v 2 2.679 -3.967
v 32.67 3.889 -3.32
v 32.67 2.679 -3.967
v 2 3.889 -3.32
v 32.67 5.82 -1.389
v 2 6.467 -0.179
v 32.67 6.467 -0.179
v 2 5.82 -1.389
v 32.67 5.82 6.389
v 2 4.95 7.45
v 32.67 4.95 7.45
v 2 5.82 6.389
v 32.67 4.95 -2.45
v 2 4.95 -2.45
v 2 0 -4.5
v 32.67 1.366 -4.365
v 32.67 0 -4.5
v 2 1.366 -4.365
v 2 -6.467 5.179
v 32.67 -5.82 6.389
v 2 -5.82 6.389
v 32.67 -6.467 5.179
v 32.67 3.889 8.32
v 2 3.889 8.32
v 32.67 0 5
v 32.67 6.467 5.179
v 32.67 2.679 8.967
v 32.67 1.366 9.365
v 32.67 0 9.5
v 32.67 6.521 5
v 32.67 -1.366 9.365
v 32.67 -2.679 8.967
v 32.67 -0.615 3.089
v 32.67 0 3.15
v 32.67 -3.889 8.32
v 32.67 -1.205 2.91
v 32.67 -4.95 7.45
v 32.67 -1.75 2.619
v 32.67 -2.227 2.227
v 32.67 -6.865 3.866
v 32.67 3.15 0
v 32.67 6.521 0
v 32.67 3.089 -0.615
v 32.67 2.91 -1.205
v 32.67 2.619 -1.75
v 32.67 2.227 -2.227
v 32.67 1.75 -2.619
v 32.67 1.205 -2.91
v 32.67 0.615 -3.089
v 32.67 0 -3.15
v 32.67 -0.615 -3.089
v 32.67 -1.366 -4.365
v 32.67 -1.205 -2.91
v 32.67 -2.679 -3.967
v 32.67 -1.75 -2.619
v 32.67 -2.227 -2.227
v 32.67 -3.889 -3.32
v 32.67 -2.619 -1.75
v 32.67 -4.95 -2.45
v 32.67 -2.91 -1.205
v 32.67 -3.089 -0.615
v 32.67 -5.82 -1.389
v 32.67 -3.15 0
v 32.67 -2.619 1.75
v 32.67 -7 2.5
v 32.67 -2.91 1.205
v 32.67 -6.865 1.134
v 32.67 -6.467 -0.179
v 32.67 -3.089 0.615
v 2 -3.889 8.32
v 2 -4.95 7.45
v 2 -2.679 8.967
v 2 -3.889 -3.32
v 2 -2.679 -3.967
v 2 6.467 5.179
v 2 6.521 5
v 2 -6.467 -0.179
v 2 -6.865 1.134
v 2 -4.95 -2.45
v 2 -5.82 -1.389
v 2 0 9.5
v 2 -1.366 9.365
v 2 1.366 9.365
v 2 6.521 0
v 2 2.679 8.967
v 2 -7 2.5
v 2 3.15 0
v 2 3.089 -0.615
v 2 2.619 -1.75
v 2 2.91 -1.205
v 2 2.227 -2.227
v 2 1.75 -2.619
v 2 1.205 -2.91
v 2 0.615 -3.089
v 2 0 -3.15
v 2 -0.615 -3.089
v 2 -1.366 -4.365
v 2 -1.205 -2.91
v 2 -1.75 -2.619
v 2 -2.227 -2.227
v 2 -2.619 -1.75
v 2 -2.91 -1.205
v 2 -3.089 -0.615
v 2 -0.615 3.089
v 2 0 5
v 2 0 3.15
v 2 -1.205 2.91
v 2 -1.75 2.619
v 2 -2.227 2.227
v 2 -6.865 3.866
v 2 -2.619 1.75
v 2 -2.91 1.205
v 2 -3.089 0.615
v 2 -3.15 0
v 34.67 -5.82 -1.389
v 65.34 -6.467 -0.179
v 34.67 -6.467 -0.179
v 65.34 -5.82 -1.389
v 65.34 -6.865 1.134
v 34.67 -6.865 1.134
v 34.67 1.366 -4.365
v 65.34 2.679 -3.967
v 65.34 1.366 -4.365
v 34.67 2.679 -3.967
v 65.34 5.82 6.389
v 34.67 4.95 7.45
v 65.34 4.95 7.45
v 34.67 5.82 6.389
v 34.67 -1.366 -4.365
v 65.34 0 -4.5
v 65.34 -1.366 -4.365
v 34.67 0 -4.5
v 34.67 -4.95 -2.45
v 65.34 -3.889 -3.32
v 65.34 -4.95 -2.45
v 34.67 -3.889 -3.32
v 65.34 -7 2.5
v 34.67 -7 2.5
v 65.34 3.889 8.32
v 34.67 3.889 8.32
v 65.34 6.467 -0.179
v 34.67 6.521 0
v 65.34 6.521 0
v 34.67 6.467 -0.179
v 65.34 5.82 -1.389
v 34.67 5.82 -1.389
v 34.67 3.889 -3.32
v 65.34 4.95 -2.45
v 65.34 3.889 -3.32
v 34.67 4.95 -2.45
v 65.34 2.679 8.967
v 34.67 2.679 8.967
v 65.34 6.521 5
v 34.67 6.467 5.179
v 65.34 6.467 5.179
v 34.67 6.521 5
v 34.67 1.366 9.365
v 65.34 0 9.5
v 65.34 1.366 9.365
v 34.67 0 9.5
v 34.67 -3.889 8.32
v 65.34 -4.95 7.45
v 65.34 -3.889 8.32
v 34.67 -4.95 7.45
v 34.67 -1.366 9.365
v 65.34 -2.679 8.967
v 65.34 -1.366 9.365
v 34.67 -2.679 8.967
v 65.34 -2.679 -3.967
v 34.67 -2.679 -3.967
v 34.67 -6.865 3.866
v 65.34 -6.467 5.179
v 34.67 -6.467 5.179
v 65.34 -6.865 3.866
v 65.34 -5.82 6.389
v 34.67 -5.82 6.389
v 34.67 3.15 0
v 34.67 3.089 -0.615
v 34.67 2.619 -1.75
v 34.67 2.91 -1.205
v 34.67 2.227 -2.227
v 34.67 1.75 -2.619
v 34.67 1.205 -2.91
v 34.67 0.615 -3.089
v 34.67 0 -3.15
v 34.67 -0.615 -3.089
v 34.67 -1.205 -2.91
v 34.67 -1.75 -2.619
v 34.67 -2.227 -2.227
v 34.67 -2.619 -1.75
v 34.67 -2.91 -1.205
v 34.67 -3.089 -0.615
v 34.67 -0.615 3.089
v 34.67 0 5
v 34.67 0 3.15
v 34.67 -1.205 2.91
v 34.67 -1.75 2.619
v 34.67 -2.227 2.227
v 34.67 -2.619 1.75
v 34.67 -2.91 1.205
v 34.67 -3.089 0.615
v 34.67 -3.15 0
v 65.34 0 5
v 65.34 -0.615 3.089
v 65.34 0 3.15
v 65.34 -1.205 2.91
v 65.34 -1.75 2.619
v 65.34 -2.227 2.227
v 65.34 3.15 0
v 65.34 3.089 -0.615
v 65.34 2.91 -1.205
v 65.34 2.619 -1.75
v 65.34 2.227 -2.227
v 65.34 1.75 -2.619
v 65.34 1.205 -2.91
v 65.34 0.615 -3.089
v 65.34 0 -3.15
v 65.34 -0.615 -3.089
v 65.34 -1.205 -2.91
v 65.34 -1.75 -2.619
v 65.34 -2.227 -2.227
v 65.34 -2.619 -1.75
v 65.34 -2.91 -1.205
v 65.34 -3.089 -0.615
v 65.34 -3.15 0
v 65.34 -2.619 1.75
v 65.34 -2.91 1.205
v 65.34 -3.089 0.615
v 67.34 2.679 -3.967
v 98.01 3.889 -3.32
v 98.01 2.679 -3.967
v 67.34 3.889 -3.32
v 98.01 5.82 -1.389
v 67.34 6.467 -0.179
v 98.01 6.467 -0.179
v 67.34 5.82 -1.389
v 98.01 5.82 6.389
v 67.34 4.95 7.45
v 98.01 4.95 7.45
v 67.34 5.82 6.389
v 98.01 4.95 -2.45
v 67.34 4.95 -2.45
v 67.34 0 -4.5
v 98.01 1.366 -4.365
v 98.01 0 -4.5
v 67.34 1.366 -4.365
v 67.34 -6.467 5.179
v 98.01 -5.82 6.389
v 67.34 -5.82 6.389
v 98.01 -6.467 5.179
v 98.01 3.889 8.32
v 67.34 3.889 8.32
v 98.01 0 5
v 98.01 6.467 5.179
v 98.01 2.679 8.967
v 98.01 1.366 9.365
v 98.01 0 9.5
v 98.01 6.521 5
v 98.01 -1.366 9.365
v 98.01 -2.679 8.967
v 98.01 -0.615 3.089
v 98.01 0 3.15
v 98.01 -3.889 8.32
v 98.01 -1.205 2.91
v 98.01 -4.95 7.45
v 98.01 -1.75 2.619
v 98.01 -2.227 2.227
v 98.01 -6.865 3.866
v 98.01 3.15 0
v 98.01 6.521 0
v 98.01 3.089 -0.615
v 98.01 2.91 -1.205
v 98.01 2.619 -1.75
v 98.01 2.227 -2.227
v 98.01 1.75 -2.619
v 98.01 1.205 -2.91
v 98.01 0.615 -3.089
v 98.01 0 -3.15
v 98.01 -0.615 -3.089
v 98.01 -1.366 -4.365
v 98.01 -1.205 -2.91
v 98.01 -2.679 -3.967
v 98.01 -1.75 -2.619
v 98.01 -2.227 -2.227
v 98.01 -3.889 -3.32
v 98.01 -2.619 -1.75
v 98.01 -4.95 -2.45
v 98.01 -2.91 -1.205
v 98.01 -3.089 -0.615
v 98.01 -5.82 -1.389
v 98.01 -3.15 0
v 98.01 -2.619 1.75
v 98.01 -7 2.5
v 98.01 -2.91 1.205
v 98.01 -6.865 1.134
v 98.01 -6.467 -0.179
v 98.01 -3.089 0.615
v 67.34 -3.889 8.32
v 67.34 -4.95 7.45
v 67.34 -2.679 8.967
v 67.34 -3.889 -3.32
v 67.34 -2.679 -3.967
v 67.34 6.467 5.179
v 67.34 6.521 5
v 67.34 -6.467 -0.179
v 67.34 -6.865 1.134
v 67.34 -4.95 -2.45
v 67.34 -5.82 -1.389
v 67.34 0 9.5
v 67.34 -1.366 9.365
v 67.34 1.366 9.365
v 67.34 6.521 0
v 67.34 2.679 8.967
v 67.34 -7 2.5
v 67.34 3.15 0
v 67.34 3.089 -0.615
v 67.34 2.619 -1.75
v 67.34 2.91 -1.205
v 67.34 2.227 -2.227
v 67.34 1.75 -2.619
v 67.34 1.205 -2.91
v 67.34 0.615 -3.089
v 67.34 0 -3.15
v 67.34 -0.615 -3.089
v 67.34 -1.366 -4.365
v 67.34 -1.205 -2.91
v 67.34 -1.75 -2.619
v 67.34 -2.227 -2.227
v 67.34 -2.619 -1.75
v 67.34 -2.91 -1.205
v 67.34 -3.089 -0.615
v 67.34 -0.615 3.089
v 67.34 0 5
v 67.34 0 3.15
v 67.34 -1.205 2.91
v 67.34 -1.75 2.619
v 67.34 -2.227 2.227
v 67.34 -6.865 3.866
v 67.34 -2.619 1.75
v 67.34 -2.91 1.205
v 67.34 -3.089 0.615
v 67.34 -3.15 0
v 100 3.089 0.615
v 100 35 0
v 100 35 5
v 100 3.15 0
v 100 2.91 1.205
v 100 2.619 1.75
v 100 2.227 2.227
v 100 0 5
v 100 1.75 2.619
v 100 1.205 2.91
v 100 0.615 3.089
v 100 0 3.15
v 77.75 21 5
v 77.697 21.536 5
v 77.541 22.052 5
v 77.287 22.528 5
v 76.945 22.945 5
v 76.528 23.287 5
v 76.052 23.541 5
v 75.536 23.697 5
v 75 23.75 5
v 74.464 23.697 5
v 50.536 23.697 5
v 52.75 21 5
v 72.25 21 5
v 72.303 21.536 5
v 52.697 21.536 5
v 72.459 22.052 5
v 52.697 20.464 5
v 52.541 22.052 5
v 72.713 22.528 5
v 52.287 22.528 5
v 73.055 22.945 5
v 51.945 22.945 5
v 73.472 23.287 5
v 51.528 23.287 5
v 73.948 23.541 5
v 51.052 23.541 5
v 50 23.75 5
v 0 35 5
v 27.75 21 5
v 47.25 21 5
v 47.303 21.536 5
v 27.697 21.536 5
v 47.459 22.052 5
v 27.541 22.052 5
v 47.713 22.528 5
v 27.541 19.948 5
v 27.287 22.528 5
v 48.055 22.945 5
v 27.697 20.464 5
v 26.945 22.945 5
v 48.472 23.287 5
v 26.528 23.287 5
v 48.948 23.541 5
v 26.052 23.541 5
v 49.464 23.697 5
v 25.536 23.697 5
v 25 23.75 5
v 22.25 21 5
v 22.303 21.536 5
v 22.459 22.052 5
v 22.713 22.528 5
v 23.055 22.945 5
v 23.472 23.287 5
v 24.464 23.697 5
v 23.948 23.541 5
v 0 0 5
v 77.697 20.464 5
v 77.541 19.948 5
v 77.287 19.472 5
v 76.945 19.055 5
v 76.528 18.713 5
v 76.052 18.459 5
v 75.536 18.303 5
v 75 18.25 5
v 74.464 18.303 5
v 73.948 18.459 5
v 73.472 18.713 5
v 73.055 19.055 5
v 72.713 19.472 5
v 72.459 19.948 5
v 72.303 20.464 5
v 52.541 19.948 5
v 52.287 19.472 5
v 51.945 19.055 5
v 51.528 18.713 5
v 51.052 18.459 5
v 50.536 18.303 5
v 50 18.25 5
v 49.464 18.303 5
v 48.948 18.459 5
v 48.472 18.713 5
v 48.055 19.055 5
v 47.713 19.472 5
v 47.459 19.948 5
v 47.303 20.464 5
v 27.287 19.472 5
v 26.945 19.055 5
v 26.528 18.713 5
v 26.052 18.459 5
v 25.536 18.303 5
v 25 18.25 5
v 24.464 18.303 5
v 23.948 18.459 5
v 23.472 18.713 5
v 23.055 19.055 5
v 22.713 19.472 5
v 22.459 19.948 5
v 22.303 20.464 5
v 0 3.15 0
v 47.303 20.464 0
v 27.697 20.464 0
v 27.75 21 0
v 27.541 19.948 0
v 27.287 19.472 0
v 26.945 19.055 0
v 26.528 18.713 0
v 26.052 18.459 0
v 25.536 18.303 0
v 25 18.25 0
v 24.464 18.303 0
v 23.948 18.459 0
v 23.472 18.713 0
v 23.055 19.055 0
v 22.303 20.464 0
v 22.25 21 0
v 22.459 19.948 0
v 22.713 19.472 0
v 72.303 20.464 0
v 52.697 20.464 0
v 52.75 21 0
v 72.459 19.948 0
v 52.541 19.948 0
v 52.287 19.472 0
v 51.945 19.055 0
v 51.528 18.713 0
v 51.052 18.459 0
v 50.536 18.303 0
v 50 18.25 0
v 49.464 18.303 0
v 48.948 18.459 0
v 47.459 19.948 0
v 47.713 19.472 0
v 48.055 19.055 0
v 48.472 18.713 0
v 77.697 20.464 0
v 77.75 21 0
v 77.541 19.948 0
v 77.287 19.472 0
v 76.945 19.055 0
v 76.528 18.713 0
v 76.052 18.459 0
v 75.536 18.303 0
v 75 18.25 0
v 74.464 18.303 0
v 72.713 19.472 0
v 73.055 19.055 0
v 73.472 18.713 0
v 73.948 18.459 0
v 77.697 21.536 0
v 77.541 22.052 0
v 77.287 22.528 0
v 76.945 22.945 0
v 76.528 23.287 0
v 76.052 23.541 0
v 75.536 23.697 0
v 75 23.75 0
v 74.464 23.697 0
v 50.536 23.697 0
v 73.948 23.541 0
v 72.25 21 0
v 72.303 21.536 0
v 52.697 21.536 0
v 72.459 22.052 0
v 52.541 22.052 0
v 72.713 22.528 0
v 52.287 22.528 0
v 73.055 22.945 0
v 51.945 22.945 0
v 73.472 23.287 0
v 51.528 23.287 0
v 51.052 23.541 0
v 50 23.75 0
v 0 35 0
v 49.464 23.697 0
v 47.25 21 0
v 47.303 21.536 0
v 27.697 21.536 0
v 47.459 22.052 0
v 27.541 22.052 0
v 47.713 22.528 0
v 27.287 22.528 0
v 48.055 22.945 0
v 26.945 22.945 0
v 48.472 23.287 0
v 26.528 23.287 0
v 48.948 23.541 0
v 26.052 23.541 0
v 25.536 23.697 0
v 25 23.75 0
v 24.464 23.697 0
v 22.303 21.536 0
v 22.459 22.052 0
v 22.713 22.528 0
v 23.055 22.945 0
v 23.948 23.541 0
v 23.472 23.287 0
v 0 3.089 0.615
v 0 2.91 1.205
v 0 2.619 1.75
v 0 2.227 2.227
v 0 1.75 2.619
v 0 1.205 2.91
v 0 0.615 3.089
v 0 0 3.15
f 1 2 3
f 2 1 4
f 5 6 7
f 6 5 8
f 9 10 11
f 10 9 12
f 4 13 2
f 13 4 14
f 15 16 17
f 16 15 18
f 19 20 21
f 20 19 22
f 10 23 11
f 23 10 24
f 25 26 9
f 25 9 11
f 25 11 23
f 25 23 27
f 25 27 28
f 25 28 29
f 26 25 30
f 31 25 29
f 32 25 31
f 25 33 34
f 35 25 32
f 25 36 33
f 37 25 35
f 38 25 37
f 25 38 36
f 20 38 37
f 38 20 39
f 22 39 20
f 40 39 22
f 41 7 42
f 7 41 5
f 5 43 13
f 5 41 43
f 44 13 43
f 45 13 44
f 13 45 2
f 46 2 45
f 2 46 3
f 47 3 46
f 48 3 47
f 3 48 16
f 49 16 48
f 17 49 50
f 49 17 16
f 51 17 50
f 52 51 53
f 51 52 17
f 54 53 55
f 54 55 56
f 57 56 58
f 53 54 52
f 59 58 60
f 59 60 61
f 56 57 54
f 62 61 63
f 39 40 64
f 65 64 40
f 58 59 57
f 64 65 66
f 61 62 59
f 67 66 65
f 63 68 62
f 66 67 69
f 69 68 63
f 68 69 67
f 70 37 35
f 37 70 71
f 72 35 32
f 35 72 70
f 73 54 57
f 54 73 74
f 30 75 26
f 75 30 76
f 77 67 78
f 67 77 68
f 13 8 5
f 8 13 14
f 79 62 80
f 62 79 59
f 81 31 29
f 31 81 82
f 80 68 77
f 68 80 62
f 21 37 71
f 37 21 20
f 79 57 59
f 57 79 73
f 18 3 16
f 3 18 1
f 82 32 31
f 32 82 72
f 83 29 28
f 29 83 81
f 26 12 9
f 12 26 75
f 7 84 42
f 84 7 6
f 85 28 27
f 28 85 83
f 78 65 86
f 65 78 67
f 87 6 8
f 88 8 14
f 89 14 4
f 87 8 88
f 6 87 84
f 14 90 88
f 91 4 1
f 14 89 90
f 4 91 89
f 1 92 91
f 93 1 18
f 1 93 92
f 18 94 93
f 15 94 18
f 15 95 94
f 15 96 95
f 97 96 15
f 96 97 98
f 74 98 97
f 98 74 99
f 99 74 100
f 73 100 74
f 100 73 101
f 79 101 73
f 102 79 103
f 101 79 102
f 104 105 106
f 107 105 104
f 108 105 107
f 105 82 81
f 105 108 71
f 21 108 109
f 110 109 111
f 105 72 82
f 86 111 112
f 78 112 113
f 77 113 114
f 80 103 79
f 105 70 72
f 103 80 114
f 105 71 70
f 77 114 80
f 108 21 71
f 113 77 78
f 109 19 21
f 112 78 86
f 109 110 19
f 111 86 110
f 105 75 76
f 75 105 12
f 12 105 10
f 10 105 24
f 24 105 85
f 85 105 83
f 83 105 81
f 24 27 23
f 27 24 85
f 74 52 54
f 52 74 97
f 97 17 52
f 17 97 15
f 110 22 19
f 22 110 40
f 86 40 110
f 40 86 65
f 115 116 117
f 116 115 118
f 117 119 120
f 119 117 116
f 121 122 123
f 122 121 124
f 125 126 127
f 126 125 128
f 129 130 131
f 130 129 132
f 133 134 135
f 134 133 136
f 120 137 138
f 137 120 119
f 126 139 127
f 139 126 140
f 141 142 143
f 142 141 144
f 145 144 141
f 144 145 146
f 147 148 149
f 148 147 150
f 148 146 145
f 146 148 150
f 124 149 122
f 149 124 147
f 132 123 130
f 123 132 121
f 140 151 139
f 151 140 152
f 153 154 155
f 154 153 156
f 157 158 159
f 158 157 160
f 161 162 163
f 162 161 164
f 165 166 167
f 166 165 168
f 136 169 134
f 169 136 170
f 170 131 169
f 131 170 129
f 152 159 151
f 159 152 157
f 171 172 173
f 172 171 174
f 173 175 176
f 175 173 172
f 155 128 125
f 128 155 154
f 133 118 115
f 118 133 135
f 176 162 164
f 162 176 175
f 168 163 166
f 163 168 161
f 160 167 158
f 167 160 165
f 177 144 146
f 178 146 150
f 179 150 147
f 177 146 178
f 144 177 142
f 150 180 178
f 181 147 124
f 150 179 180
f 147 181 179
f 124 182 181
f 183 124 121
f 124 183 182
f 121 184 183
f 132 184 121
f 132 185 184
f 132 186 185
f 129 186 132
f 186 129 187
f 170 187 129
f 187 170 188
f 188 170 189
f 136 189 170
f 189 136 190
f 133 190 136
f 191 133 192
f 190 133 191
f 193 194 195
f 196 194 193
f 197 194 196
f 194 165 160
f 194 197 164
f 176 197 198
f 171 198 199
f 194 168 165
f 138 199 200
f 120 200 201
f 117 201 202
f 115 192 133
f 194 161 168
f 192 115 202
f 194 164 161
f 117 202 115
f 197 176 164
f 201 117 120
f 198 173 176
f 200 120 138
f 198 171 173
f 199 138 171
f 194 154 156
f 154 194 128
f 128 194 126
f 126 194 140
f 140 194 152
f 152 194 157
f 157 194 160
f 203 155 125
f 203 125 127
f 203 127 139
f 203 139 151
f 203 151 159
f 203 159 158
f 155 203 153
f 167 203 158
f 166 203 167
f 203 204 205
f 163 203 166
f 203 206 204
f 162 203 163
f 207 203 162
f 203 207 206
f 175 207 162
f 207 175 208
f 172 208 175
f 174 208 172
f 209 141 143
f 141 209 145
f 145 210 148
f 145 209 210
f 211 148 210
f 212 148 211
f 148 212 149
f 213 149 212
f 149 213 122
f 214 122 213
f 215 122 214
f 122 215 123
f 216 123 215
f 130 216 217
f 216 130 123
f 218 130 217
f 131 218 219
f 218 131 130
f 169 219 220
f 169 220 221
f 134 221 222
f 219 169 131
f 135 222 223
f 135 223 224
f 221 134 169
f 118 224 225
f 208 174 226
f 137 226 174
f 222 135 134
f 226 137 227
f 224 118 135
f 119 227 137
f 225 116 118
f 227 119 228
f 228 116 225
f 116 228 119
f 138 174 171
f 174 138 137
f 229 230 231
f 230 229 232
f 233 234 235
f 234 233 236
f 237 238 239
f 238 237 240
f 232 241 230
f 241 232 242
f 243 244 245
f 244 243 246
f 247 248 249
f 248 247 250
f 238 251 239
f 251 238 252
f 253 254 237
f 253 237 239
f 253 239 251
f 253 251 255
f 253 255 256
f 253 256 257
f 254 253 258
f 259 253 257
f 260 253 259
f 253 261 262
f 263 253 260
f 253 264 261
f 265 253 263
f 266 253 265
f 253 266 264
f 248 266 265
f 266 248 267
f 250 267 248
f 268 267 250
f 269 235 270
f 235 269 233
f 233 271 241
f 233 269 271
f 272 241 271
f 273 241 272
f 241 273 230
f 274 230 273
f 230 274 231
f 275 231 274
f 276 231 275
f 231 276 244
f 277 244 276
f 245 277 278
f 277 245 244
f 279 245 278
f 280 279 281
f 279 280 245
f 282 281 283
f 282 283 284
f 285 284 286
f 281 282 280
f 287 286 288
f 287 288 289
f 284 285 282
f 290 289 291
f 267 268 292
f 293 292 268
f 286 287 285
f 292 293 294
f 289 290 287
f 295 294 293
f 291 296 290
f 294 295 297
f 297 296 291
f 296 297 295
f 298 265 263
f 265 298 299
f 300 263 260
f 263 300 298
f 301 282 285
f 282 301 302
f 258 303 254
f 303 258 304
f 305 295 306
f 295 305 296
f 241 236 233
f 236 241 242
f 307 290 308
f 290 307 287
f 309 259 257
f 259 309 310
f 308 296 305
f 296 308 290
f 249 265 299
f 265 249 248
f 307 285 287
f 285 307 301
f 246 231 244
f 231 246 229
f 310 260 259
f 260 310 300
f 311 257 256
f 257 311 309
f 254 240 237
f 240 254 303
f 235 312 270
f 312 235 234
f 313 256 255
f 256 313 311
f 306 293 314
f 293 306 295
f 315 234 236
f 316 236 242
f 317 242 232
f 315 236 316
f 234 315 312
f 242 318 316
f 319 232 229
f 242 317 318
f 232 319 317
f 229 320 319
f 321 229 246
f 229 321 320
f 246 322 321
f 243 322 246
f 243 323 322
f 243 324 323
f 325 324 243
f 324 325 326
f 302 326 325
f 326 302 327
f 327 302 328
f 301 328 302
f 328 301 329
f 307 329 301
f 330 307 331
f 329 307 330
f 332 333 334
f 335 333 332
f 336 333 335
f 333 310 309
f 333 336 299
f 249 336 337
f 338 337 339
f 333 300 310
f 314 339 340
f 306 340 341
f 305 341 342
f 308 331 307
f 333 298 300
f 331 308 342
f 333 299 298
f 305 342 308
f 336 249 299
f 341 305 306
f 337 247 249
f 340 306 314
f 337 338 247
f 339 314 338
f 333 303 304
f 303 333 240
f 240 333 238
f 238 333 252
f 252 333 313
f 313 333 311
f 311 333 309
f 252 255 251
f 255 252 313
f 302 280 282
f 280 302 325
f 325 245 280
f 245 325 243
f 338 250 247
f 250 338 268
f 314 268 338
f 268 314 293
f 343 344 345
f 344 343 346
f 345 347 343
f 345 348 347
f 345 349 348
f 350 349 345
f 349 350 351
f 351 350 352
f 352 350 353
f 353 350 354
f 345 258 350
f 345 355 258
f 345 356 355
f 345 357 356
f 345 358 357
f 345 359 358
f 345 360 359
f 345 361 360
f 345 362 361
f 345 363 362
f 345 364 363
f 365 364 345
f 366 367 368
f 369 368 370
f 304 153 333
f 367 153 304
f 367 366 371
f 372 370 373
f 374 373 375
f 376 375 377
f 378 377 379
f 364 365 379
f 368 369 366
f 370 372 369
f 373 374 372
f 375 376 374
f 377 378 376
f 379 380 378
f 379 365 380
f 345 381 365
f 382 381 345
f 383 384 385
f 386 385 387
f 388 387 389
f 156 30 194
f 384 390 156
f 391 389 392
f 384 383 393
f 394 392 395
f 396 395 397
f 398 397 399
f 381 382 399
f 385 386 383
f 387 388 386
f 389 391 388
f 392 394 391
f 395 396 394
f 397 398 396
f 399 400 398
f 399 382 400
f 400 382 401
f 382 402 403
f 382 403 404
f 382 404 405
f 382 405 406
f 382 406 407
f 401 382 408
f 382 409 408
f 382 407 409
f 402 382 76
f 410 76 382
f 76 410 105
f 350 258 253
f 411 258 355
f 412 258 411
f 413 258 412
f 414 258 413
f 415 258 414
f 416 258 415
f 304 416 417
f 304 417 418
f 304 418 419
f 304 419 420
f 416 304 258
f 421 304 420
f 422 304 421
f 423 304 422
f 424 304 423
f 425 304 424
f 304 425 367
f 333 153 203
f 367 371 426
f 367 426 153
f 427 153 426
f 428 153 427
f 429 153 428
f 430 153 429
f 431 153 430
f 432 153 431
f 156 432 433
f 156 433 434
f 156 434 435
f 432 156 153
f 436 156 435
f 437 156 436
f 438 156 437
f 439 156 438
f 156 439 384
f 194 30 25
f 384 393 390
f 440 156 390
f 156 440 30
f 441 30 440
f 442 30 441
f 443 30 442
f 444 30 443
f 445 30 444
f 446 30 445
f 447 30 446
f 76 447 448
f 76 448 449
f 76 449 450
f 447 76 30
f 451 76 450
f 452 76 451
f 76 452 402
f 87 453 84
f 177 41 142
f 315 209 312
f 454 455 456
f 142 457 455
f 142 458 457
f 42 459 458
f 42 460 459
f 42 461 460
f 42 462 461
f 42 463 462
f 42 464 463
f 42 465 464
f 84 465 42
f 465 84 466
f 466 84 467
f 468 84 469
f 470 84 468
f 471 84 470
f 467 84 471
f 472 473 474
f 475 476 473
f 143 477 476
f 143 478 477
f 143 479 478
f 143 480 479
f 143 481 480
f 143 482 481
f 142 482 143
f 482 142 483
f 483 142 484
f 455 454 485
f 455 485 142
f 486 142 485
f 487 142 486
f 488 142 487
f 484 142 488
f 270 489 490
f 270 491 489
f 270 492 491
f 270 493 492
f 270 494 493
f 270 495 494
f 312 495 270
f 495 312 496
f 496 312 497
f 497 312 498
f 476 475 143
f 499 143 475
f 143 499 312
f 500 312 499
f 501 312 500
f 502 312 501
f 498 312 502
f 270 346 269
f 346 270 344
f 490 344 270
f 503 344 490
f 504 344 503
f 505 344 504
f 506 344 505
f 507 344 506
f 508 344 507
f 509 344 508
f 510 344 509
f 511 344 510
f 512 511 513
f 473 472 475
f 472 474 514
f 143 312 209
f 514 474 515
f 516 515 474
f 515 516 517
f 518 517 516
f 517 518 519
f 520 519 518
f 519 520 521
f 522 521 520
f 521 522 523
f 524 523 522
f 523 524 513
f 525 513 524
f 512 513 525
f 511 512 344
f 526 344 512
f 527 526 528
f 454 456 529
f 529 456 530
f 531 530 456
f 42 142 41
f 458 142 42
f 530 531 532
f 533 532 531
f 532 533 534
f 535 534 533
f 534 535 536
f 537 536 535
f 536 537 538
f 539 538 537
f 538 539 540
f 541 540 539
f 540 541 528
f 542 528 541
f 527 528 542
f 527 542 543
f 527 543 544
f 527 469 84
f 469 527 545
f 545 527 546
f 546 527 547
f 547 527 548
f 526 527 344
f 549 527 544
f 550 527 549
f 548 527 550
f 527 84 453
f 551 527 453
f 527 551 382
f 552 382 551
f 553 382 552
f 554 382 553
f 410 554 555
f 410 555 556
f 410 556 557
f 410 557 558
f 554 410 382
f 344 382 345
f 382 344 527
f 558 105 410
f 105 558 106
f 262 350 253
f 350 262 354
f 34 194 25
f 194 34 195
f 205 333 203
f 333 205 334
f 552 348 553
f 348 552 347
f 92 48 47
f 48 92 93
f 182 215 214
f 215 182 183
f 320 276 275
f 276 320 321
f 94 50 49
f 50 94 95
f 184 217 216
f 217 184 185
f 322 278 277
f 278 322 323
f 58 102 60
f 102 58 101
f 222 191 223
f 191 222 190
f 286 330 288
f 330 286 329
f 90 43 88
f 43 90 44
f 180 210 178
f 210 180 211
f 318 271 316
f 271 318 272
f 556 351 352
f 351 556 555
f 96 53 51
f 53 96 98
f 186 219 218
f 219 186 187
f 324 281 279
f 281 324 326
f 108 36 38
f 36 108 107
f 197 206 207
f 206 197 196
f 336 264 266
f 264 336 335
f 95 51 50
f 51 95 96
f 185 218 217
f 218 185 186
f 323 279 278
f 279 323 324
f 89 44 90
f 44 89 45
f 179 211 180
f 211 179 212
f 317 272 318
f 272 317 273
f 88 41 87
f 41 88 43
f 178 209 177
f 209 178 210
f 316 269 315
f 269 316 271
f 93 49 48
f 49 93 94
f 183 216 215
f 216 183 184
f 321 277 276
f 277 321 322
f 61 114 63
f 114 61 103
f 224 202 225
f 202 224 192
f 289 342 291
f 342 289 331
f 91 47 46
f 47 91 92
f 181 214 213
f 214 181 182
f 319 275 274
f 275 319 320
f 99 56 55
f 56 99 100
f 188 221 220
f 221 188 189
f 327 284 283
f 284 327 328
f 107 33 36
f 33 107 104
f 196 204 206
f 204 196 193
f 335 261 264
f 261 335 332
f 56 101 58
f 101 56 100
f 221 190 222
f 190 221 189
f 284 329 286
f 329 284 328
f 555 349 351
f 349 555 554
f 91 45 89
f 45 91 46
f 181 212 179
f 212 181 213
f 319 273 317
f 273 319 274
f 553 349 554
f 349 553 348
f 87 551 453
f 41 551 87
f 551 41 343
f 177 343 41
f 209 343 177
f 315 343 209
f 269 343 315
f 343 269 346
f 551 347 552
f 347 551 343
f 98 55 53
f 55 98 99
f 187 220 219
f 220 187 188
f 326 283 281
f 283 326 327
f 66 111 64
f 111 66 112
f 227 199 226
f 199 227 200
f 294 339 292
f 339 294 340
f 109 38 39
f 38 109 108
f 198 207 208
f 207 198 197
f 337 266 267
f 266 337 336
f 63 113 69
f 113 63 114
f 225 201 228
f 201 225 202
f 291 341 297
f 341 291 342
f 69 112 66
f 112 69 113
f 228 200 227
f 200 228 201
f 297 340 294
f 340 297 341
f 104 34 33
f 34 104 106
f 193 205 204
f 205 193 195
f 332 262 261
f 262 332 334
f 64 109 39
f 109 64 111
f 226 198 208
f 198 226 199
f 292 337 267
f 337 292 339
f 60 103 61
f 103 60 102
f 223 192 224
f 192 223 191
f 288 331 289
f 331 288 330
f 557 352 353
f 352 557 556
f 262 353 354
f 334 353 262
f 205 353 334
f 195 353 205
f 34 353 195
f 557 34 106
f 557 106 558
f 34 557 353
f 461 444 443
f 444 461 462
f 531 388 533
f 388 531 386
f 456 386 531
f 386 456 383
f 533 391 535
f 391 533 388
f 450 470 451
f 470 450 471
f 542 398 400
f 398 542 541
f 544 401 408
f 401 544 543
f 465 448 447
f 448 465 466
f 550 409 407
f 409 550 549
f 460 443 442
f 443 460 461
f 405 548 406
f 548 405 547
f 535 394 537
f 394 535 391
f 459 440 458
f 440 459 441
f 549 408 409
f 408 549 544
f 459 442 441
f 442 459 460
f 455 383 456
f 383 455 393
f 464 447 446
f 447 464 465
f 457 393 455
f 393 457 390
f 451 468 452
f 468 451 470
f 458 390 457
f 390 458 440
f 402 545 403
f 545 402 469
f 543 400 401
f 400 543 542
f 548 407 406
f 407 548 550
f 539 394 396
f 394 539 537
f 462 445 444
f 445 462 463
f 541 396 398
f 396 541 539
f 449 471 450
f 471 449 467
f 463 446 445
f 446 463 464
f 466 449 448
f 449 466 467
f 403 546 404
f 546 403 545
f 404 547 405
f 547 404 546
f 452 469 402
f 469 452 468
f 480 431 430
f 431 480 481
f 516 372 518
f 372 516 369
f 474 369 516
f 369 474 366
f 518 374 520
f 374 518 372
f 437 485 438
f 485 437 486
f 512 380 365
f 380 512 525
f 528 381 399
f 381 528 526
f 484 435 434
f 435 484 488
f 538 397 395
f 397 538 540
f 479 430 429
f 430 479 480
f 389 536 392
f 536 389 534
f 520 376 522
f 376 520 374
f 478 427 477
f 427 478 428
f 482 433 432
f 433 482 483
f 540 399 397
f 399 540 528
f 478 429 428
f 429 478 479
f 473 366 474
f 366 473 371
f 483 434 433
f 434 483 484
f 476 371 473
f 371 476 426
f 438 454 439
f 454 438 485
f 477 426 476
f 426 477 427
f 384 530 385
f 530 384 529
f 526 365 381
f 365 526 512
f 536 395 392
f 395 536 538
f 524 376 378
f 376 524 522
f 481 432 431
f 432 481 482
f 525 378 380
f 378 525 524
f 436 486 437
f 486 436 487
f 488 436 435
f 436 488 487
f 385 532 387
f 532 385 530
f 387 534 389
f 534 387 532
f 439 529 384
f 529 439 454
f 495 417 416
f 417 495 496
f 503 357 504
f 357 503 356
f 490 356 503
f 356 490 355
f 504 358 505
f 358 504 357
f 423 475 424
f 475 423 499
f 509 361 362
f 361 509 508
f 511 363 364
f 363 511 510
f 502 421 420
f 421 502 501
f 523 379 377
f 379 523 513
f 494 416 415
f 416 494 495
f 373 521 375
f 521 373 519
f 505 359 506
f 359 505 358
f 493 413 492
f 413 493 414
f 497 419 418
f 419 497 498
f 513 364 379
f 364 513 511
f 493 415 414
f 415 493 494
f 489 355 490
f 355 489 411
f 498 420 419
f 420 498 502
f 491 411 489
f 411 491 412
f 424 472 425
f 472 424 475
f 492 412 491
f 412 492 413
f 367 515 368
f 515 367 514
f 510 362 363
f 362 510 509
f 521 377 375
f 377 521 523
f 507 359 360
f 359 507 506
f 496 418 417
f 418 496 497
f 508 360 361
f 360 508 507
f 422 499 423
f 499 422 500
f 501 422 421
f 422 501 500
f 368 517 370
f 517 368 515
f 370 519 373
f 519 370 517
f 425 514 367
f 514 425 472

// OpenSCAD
$fn = 32;

// ----------------------------------------------------------------------
// Hinge leaf: 100 x 42 x 14 mm
// ----------------------------------------------------------------------

// --- parameters (mm) ---
leaf_len = 100;           // leaf length, X
leaf_w = 35;              // leaf width, Y
leaf_t = 5;               // leaf thickness
knuckle_d = 14;           // knuckle diameter
knuckle_w = 30.67;        // knuckle width
knuckle_n = 3;            // number of knuckles
pin_d = 6.3;              // pin bore
gap = 2;                  // gap between the knuckles
screw_d = 5.5;            // screw clearance

module leaf() {
  cube([leaf_len, leaf_w, leaf_t]);
}

module knuckles() {
  /* barrels sit on the leaf edge, the pin axis at half the leaf thickness */
  for (i = [0 : knuckle_n - 1])
    translate([gap + i * (knuckle_w + gap), 0, leaf_t * 0.5])
      rotate([0, 90, 0]) cylinder(h = knuckle_w, d = knuckle_d);
}

difference() {
  union() {
    leaf();
    knuckles();
  }
  rotate([0, 90, 0]) translate([0, 0, -1])
    cylinder(h = leaf_len + 2, d = pin_d);
  translate([25, leaf_w * 0.6, -1]) cylinder(h = leaf_t + 2, d = screw_d);
  translate([50, leaf_w * 0.6, -1]) cylinder(h = leaf_t + 2, d = screw_d);
  translate([75, leaf_w * 0.6, -1]) cylinder(h = leaf_t + 2, d = screw_d);
}
